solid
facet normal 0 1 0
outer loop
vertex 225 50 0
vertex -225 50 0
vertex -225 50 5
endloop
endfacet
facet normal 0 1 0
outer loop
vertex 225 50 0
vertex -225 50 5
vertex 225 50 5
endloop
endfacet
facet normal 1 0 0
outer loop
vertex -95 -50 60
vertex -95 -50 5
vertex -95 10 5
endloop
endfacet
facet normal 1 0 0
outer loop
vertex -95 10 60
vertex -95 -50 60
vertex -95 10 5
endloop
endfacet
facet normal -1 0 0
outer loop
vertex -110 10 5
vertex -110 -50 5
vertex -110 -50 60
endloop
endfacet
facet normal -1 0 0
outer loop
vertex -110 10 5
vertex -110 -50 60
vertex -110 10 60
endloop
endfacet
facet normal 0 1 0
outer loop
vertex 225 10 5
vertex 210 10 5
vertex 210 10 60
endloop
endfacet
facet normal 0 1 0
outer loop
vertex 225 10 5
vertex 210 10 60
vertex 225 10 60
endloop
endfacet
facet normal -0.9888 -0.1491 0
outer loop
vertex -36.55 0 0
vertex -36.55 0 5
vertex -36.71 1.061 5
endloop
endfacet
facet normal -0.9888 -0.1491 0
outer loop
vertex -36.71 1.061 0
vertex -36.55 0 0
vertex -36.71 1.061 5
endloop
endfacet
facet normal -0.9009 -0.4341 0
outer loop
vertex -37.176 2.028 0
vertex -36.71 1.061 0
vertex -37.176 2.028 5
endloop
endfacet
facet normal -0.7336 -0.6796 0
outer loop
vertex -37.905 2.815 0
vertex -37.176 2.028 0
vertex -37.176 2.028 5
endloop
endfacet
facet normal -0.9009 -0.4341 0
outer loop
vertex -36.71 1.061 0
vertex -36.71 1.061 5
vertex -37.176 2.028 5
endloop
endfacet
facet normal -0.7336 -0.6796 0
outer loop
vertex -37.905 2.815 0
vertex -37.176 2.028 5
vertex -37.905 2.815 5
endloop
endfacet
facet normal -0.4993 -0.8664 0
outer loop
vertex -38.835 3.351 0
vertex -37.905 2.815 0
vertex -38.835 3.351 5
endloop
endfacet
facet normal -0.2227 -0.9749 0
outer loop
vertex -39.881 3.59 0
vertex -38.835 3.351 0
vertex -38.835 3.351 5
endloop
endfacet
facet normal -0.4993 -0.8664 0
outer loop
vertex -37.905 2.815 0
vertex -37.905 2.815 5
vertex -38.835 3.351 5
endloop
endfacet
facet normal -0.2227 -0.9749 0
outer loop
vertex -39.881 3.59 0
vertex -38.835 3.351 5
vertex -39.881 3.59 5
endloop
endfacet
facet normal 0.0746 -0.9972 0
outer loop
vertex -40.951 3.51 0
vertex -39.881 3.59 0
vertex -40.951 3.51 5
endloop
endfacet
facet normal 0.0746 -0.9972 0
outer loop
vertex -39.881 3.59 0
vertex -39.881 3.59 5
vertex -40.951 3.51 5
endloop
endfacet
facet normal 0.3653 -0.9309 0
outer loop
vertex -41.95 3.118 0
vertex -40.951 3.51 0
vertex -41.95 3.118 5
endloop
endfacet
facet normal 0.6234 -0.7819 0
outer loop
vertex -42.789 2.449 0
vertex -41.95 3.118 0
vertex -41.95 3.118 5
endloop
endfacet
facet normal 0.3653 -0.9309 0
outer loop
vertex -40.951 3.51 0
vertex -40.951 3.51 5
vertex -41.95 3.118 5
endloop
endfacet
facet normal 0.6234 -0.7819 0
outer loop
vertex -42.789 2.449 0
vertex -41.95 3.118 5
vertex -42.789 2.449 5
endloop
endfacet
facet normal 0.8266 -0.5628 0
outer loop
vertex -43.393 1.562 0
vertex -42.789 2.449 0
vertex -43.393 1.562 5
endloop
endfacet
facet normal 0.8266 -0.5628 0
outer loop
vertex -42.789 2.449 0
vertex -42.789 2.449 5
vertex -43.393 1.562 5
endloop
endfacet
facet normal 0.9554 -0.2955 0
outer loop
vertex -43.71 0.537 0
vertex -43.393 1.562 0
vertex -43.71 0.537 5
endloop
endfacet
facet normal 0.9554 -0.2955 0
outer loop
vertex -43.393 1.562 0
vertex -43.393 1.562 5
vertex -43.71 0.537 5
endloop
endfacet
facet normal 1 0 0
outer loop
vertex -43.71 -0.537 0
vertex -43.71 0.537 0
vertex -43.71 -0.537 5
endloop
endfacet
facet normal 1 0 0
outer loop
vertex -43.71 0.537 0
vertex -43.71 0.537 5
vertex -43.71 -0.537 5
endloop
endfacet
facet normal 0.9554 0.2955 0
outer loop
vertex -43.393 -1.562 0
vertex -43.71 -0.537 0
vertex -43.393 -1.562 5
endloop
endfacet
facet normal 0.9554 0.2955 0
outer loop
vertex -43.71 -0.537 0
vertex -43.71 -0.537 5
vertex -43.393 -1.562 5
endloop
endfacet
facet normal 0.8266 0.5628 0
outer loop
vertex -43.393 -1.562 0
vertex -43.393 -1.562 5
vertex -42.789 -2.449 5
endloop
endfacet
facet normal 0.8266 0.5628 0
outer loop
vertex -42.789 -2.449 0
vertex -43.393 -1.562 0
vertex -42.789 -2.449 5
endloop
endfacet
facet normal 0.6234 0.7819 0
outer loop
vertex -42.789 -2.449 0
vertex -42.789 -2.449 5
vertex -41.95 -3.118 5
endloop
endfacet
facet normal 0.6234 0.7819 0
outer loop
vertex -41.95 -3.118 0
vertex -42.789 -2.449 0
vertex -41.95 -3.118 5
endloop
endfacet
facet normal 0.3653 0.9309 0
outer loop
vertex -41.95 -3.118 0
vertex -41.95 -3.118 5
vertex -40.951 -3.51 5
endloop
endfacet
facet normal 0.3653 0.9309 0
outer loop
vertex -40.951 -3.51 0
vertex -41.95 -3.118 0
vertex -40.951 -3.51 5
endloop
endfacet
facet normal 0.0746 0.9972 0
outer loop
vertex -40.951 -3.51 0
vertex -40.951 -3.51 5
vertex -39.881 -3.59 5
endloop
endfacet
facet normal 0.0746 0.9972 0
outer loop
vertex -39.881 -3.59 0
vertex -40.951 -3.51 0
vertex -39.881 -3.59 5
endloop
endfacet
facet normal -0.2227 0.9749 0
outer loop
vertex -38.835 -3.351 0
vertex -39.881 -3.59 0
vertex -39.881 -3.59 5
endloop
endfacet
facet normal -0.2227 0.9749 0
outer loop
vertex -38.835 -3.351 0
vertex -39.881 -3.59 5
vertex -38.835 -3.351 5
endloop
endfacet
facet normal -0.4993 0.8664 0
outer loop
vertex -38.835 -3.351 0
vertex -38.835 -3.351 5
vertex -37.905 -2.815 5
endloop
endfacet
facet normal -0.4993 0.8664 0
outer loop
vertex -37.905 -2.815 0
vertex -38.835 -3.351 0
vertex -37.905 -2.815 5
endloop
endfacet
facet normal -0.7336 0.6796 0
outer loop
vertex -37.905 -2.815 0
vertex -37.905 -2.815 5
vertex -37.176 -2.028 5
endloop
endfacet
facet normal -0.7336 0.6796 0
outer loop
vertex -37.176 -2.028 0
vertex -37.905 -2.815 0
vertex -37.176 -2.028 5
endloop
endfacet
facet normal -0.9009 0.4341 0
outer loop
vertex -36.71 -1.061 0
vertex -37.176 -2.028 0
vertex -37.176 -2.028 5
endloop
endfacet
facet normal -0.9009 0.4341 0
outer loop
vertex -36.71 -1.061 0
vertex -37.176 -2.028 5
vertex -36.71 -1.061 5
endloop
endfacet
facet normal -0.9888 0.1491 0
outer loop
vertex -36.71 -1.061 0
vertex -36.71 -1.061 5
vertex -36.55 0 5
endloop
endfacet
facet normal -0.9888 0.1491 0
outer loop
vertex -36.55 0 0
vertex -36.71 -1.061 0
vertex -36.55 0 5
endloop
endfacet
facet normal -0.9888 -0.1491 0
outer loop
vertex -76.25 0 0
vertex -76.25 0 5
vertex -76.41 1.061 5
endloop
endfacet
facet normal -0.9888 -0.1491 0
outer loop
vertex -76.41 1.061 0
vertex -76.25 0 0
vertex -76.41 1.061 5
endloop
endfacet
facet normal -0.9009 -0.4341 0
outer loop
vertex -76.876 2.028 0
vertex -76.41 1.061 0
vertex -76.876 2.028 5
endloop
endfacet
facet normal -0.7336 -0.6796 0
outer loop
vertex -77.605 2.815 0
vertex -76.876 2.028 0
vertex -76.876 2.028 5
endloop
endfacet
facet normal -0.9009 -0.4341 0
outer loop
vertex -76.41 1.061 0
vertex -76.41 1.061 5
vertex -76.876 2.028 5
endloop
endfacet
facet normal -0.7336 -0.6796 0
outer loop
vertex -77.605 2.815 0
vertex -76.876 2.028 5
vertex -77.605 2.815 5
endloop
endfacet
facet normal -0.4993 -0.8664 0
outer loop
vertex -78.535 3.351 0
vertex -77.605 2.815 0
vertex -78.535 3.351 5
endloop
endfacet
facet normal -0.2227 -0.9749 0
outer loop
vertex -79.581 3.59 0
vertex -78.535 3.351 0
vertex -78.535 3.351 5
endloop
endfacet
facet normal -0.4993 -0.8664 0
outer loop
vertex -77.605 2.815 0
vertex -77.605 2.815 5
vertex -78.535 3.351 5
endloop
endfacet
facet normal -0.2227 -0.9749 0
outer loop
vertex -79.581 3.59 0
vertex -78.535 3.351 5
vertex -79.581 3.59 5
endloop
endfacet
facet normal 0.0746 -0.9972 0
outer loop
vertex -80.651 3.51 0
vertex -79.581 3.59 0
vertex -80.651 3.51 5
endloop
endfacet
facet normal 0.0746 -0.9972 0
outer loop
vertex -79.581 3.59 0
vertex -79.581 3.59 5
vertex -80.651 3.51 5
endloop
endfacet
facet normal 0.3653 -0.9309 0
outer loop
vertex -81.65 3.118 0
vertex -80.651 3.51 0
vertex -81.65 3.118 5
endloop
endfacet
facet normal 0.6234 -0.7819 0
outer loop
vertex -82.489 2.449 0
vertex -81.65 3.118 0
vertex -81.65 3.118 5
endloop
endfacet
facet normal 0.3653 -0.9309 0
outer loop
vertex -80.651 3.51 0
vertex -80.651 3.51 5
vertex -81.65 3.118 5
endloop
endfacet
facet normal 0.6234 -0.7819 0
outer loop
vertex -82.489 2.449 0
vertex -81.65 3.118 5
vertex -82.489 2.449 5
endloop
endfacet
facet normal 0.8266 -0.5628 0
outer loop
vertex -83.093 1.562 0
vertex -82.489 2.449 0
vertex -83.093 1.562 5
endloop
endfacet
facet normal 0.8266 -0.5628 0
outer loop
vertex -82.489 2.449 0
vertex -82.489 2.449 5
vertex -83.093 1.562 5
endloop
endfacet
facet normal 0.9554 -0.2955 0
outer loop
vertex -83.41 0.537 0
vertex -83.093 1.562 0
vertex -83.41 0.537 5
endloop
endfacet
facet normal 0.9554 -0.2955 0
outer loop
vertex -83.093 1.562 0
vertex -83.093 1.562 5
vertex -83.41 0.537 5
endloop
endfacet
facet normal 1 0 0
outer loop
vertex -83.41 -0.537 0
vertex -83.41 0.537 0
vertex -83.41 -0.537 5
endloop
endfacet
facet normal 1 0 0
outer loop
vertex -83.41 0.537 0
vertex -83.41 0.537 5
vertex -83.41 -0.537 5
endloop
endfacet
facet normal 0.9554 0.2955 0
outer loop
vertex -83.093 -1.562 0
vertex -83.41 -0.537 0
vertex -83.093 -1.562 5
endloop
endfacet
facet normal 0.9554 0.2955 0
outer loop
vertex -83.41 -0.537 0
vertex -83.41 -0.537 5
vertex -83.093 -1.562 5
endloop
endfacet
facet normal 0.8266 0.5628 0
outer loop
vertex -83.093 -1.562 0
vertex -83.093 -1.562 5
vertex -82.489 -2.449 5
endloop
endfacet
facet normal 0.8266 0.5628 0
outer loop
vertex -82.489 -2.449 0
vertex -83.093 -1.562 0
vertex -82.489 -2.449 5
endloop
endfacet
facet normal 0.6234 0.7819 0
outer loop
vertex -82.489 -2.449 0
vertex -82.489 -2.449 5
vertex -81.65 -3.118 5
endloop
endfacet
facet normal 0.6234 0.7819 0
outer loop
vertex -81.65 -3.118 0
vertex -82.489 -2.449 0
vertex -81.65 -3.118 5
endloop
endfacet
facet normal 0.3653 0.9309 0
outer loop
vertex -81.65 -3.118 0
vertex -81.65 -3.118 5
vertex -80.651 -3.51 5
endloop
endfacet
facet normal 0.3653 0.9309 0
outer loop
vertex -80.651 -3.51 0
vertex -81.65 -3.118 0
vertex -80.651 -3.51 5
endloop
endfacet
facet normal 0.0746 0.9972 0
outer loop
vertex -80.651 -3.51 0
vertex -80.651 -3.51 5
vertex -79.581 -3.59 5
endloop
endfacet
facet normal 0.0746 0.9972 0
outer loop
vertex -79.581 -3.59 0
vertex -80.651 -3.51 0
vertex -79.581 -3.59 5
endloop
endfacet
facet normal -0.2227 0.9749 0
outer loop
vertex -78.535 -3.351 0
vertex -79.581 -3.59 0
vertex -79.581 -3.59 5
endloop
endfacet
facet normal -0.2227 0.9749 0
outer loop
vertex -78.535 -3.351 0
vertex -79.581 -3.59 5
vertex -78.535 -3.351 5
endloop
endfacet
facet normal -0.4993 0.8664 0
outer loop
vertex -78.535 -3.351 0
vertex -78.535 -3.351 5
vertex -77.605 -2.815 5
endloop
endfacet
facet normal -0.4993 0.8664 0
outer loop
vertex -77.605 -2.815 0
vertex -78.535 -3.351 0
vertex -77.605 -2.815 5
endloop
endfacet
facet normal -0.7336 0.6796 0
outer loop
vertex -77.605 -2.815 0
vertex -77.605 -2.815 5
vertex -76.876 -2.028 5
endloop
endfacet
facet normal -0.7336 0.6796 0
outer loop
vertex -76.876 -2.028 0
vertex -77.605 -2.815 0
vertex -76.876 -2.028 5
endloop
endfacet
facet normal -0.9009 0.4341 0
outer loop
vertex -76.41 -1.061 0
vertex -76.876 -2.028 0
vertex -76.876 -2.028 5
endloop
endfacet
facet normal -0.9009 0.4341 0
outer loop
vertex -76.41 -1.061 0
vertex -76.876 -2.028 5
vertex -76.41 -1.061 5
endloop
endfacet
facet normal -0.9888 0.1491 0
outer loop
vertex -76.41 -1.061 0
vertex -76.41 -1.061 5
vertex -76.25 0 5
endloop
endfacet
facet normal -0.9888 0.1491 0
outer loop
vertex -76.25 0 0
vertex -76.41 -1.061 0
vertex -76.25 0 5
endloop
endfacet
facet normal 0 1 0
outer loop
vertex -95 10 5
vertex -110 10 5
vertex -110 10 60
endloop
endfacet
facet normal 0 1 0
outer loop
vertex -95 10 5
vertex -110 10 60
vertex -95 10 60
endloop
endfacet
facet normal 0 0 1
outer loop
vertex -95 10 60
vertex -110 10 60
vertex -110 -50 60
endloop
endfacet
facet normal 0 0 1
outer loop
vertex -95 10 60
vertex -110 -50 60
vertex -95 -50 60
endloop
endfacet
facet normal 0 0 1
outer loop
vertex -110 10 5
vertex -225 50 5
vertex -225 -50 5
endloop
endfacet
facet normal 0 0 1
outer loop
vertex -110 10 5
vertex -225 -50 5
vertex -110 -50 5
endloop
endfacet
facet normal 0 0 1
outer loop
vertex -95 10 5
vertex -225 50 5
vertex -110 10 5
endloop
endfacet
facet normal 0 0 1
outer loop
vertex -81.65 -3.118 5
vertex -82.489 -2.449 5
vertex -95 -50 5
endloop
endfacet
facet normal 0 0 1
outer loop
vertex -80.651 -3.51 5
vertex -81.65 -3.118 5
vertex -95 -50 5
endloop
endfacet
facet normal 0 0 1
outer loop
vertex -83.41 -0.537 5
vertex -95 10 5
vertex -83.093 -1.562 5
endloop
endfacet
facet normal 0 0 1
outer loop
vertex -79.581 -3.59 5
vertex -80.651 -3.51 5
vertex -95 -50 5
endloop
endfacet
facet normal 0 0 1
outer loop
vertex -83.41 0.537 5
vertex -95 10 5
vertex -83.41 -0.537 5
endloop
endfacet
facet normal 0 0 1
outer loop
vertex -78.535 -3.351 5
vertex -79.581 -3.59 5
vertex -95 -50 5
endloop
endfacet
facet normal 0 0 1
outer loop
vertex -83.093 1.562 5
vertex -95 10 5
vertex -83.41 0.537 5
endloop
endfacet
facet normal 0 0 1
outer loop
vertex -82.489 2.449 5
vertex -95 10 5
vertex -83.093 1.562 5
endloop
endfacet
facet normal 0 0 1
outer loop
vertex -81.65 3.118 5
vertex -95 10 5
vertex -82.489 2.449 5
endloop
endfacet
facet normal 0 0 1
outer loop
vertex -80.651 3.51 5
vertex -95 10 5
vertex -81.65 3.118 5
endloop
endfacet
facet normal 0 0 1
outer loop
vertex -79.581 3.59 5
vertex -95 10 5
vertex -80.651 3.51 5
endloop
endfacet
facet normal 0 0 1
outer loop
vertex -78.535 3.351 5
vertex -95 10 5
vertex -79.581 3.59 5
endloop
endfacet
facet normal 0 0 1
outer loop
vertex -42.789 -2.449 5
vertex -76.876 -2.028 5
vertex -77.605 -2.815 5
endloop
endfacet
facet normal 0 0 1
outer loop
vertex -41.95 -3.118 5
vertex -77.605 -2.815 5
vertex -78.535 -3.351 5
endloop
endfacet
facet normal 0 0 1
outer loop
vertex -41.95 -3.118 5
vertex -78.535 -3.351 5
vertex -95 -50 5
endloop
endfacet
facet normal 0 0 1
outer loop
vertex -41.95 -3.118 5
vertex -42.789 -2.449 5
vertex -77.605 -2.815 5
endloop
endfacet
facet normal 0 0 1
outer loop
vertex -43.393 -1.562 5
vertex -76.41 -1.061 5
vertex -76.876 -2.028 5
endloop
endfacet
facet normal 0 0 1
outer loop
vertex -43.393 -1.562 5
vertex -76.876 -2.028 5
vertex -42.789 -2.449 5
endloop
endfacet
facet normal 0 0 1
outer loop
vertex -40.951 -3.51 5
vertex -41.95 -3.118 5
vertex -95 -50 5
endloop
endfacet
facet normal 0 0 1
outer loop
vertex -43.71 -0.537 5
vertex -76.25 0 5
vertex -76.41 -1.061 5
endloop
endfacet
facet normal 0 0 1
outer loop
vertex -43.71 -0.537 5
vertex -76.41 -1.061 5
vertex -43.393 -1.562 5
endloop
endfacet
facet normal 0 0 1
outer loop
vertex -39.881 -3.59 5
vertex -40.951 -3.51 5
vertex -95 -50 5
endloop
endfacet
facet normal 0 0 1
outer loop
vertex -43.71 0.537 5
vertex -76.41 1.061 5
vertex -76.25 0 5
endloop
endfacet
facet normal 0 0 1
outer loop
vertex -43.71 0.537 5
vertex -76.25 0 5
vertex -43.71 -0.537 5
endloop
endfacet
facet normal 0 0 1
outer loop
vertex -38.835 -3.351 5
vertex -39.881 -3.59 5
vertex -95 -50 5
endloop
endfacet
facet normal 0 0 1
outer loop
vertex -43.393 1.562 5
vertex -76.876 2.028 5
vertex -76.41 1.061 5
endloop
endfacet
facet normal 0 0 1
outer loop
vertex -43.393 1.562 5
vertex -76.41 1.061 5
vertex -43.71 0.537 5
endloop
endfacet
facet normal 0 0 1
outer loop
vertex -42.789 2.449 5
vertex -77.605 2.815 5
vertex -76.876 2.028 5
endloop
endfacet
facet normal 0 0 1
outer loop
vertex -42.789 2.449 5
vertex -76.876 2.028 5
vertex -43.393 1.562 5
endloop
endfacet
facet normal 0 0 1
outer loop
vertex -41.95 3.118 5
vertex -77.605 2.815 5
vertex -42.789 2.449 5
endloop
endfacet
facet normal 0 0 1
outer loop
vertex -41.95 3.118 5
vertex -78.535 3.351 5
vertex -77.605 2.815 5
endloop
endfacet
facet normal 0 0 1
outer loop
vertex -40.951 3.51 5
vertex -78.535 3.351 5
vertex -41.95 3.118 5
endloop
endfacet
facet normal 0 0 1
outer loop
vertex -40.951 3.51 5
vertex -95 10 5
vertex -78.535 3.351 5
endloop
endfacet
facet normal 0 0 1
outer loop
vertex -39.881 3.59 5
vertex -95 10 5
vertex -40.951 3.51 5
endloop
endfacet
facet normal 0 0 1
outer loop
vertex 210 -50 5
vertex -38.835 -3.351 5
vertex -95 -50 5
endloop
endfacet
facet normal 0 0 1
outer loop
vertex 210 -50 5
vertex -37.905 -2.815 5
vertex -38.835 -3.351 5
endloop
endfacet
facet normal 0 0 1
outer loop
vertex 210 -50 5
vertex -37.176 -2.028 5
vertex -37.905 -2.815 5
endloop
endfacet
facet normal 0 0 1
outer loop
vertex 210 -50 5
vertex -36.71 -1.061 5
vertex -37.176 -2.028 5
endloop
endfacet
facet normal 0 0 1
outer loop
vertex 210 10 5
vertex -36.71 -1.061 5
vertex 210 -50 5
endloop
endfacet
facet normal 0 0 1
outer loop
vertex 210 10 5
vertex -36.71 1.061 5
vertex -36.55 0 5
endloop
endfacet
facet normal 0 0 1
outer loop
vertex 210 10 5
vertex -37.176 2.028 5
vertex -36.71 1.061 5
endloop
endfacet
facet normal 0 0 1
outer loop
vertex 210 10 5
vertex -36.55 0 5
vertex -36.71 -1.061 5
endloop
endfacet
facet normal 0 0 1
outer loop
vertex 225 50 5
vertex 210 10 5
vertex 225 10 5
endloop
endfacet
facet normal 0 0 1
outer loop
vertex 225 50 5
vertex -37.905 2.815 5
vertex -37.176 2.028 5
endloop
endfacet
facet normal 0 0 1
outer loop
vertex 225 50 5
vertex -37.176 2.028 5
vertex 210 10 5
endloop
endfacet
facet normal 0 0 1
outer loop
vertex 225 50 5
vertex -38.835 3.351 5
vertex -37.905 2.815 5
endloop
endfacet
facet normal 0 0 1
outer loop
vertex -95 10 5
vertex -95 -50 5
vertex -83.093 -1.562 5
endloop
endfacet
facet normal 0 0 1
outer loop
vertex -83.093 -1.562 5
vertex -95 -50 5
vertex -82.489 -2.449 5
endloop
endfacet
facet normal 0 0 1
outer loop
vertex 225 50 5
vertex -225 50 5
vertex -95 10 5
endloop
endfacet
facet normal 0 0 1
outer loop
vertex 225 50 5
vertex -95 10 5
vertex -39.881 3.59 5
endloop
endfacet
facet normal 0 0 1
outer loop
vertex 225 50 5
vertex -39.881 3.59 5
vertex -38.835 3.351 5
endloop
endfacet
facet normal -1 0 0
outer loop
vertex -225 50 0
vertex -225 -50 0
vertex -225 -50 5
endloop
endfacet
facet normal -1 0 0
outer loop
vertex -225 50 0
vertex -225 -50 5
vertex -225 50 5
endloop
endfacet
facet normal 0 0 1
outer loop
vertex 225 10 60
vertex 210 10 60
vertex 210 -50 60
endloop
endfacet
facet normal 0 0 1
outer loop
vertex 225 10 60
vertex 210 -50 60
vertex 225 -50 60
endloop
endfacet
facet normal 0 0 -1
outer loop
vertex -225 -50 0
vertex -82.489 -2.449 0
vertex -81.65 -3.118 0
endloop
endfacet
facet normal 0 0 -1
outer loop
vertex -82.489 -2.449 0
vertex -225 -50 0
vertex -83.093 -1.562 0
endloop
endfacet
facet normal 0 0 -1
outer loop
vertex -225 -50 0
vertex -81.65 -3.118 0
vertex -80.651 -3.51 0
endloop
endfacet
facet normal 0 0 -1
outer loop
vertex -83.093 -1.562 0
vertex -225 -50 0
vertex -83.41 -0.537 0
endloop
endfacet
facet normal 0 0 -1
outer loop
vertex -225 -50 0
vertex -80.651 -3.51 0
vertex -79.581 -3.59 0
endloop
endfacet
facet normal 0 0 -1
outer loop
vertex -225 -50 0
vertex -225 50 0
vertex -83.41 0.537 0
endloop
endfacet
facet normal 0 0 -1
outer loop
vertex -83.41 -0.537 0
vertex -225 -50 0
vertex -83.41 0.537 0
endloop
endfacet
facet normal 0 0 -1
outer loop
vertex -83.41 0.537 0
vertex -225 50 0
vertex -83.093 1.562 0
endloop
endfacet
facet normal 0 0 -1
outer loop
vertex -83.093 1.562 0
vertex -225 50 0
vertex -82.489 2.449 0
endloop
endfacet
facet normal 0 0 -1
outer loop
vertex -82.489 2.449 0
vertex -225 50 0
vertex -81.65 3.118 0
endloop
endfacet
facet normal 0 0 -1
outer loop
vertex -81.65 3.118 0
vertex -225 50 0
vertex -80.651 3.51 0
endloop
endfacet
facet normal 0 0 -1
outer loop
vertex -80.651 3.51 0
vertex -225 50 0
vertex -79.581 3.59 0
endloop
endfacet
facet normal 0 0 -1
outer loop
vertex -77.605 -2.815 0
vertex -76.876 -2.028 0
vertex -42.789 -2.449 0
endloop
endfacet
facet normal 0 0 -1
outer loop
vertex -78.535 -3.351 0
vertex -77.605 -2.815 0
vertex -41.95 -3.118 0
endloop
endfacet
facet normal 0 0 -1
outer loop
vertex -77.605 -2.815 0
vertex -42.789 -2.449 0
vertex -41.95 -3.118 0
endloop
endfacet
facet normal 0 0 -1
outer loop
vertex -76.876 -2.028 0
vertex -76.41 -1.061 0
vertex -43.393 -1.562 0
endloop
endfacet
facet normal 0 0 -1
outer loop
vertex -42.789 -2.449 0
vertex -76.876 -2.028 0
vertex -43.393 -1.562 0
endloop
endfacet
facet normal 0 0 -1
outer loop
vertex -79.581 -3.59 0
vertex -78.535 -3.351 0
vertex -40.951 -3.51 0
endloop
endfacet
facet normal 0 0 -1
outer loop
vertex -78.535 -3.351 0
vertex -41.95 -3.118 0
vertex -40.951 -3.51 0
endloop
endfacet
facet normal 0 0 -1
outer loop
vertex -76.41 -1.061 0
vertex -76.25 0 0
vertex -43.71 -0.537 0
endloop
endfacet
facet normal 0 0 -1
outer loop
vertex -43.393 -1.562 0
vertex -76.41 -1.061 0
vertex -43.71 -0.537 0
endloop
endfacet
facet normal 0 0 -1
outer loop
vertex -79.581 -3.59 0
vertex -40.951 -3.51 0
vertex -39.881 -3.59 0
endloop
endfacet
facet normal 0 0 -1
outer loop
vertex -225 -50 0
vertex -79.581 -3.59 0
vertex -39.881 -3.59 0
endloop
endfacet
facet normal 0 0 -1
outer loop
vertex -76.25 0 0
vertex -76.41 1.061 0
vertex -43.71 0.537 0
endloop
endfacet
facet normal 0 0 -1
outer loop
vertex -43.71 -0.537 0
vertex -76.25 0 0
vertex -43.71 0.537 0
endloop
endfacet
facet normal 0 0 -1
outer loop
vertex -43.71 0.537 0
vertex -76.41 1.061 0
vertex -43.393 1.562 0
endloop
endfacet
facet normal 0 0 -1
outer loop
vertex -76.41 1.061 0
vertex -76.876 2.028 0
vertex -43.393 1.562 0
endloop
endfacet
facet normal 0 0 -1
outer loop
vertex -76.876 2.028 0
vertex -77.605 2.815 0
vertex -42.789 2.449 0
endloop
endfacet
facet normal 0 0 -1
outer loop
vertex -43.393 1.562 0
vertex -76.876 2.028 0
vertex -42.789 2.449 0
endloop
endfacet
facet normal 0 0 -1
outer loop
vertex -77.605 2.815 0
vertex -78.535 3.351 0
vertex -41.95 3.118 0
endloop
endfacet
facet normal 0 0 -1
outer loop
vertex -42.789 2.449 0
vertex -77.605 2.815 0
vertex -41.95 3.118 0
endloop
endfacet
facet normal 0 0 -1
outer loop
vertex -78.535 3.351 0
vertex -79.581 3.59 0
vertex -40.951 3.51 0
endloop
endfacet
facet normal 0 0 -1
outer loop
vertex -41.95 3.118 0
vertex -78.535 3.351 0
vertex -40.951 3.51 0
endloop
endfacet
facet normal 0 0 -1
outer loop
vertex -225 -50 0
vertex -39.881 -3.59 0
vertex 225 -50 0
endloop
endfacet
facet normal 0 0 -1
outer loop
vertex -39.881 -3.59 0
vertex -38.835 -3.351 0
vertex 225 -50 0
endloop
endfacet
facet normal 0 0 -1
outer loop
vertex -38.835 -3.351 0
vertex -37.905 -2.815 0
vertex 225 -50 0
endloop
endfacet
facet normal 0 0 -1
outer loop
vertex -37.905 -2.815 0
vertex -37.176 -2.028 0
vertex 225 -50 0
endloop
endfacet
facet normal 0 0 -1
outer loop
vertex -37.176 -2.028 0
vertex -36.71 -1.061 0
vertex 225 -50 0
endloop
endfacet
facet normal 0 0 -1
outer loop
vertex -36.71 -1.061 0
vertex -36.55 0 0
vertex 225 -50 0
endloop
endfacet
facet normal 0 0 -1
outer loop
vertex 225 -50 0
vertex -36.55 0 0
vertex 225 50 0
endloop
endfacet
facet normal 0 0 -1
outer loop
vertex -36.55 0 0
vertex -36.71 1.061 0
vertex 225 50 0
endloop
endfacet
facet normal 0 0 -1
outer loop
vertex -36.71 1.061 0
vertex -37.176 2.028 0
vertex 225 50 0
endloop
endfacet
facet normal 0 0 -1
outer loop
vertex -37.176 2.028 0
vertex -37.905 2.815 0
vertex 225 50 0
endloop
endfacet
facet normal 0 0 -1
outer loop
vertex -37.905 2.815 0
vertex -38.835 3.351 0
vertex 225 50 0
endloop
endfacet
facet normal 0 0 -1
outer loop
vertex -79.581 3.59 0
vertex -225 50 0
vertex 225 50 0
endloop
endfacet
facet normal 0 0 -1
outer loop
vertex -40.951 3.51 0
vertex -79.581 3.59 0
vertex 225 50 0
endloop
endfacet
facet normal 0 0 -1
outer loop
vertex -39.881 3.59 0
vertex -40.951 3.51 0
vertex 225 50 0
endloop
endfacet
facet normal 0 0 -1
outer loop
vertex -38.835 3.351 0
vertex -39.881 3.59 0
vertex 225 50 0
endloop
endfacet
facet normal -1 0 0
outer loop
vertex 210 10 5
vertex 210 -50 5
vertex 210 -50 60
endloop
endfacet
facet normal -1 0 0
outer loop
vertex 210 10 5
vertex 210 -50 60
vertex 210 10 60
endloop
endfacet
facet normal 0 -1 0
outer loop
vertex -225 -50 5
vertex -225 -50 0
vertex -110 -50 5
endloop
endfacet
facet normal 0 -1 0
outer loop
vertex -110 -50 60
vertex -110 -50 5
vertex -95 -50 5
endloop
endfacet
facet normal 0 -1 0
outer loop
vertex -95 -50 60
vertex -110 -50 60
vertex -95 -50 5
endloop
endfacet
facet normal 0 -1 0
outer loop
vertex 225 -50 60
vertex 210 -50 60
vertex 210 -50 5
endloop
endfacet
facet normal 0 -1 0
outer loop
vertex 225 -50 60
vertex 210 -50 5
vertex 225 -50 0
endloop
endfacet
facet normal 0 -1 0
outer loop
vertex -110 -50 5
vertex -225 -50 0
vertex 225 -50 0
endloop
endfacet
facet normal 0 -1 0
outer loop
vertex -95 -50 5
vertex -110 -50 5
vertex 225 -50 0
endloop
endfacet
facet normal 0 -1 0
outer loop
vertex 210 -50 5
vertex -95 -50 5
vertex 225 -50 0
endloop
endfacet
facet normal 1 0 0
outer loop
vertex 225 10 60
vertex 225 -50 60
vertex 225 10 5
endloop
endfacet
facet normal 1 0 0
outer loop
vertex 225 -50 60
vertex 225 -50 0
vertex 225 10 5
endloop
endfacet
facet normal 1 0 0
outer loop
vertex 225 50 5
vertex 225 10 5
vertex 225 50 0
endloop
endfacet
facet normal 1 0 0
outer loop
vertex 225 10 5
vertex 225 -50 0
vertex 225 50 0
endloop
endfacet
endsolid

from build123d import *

# Parameters (mm, degrees)
SKETCH1_W               = 450
SKETCH1_H               = 100
BOSS_EXTRUDE1_DEPTH     = 5
SKETCH2_W               = 15
SKETCH2_H               = 60
BOSS_EXTRUDE2_DEPTH     = 55
SKETCH3_R               = 3.6
CUT_EXTRUDE1_DEPTH      = 56
CUT_EXTRUDE1_DEPTH_BACK = 6


with BuildPart() as part:
    # Sketch1 → Boss-Extrude1 (new body)
    with BuildSketch(Plane.XY):
        Rectangle(SKETCH1_W, SKETCH1_H)
    extrude(amount=BOSS_EXTRUDE1_DEPTH)

    # Sketch2 → Boss-Extrude2 (add)
    with BuildSketch(Plane.XY.offset(5)):
        with Locations((217.5, -20)):
            Rectangle(SKETCH2_W, SKETCH2_H)
        with Locations((-102.5, -20)):
            Rectangle(SKETCH2_W, SKETCH2_H)
    extrude(amount=BOSS_EXTRUDE2_DEPTH)

    # Sketch3 → Cut-Extrude1 (cut, two sides)
    with BuildSketch(Plane.XY.offset(5)) as cut_extrude1_sk:
        with Locations((-79.85, 0)):
            Circle(SKETCH3_R)
        with Locations((-40.15, 0)):
            Circle(SKETCH3_R)
    extrude(amount=CUT_EXTRUDE1_DEPTH, mode=Mode.SUBTRACT)
    extrude(cut_extrude1_sk.sketch, amount=-CUT_EXTRUDE1_DEPTH_BACK, mode=Mode.SUBTRACT)


solid = part.part
